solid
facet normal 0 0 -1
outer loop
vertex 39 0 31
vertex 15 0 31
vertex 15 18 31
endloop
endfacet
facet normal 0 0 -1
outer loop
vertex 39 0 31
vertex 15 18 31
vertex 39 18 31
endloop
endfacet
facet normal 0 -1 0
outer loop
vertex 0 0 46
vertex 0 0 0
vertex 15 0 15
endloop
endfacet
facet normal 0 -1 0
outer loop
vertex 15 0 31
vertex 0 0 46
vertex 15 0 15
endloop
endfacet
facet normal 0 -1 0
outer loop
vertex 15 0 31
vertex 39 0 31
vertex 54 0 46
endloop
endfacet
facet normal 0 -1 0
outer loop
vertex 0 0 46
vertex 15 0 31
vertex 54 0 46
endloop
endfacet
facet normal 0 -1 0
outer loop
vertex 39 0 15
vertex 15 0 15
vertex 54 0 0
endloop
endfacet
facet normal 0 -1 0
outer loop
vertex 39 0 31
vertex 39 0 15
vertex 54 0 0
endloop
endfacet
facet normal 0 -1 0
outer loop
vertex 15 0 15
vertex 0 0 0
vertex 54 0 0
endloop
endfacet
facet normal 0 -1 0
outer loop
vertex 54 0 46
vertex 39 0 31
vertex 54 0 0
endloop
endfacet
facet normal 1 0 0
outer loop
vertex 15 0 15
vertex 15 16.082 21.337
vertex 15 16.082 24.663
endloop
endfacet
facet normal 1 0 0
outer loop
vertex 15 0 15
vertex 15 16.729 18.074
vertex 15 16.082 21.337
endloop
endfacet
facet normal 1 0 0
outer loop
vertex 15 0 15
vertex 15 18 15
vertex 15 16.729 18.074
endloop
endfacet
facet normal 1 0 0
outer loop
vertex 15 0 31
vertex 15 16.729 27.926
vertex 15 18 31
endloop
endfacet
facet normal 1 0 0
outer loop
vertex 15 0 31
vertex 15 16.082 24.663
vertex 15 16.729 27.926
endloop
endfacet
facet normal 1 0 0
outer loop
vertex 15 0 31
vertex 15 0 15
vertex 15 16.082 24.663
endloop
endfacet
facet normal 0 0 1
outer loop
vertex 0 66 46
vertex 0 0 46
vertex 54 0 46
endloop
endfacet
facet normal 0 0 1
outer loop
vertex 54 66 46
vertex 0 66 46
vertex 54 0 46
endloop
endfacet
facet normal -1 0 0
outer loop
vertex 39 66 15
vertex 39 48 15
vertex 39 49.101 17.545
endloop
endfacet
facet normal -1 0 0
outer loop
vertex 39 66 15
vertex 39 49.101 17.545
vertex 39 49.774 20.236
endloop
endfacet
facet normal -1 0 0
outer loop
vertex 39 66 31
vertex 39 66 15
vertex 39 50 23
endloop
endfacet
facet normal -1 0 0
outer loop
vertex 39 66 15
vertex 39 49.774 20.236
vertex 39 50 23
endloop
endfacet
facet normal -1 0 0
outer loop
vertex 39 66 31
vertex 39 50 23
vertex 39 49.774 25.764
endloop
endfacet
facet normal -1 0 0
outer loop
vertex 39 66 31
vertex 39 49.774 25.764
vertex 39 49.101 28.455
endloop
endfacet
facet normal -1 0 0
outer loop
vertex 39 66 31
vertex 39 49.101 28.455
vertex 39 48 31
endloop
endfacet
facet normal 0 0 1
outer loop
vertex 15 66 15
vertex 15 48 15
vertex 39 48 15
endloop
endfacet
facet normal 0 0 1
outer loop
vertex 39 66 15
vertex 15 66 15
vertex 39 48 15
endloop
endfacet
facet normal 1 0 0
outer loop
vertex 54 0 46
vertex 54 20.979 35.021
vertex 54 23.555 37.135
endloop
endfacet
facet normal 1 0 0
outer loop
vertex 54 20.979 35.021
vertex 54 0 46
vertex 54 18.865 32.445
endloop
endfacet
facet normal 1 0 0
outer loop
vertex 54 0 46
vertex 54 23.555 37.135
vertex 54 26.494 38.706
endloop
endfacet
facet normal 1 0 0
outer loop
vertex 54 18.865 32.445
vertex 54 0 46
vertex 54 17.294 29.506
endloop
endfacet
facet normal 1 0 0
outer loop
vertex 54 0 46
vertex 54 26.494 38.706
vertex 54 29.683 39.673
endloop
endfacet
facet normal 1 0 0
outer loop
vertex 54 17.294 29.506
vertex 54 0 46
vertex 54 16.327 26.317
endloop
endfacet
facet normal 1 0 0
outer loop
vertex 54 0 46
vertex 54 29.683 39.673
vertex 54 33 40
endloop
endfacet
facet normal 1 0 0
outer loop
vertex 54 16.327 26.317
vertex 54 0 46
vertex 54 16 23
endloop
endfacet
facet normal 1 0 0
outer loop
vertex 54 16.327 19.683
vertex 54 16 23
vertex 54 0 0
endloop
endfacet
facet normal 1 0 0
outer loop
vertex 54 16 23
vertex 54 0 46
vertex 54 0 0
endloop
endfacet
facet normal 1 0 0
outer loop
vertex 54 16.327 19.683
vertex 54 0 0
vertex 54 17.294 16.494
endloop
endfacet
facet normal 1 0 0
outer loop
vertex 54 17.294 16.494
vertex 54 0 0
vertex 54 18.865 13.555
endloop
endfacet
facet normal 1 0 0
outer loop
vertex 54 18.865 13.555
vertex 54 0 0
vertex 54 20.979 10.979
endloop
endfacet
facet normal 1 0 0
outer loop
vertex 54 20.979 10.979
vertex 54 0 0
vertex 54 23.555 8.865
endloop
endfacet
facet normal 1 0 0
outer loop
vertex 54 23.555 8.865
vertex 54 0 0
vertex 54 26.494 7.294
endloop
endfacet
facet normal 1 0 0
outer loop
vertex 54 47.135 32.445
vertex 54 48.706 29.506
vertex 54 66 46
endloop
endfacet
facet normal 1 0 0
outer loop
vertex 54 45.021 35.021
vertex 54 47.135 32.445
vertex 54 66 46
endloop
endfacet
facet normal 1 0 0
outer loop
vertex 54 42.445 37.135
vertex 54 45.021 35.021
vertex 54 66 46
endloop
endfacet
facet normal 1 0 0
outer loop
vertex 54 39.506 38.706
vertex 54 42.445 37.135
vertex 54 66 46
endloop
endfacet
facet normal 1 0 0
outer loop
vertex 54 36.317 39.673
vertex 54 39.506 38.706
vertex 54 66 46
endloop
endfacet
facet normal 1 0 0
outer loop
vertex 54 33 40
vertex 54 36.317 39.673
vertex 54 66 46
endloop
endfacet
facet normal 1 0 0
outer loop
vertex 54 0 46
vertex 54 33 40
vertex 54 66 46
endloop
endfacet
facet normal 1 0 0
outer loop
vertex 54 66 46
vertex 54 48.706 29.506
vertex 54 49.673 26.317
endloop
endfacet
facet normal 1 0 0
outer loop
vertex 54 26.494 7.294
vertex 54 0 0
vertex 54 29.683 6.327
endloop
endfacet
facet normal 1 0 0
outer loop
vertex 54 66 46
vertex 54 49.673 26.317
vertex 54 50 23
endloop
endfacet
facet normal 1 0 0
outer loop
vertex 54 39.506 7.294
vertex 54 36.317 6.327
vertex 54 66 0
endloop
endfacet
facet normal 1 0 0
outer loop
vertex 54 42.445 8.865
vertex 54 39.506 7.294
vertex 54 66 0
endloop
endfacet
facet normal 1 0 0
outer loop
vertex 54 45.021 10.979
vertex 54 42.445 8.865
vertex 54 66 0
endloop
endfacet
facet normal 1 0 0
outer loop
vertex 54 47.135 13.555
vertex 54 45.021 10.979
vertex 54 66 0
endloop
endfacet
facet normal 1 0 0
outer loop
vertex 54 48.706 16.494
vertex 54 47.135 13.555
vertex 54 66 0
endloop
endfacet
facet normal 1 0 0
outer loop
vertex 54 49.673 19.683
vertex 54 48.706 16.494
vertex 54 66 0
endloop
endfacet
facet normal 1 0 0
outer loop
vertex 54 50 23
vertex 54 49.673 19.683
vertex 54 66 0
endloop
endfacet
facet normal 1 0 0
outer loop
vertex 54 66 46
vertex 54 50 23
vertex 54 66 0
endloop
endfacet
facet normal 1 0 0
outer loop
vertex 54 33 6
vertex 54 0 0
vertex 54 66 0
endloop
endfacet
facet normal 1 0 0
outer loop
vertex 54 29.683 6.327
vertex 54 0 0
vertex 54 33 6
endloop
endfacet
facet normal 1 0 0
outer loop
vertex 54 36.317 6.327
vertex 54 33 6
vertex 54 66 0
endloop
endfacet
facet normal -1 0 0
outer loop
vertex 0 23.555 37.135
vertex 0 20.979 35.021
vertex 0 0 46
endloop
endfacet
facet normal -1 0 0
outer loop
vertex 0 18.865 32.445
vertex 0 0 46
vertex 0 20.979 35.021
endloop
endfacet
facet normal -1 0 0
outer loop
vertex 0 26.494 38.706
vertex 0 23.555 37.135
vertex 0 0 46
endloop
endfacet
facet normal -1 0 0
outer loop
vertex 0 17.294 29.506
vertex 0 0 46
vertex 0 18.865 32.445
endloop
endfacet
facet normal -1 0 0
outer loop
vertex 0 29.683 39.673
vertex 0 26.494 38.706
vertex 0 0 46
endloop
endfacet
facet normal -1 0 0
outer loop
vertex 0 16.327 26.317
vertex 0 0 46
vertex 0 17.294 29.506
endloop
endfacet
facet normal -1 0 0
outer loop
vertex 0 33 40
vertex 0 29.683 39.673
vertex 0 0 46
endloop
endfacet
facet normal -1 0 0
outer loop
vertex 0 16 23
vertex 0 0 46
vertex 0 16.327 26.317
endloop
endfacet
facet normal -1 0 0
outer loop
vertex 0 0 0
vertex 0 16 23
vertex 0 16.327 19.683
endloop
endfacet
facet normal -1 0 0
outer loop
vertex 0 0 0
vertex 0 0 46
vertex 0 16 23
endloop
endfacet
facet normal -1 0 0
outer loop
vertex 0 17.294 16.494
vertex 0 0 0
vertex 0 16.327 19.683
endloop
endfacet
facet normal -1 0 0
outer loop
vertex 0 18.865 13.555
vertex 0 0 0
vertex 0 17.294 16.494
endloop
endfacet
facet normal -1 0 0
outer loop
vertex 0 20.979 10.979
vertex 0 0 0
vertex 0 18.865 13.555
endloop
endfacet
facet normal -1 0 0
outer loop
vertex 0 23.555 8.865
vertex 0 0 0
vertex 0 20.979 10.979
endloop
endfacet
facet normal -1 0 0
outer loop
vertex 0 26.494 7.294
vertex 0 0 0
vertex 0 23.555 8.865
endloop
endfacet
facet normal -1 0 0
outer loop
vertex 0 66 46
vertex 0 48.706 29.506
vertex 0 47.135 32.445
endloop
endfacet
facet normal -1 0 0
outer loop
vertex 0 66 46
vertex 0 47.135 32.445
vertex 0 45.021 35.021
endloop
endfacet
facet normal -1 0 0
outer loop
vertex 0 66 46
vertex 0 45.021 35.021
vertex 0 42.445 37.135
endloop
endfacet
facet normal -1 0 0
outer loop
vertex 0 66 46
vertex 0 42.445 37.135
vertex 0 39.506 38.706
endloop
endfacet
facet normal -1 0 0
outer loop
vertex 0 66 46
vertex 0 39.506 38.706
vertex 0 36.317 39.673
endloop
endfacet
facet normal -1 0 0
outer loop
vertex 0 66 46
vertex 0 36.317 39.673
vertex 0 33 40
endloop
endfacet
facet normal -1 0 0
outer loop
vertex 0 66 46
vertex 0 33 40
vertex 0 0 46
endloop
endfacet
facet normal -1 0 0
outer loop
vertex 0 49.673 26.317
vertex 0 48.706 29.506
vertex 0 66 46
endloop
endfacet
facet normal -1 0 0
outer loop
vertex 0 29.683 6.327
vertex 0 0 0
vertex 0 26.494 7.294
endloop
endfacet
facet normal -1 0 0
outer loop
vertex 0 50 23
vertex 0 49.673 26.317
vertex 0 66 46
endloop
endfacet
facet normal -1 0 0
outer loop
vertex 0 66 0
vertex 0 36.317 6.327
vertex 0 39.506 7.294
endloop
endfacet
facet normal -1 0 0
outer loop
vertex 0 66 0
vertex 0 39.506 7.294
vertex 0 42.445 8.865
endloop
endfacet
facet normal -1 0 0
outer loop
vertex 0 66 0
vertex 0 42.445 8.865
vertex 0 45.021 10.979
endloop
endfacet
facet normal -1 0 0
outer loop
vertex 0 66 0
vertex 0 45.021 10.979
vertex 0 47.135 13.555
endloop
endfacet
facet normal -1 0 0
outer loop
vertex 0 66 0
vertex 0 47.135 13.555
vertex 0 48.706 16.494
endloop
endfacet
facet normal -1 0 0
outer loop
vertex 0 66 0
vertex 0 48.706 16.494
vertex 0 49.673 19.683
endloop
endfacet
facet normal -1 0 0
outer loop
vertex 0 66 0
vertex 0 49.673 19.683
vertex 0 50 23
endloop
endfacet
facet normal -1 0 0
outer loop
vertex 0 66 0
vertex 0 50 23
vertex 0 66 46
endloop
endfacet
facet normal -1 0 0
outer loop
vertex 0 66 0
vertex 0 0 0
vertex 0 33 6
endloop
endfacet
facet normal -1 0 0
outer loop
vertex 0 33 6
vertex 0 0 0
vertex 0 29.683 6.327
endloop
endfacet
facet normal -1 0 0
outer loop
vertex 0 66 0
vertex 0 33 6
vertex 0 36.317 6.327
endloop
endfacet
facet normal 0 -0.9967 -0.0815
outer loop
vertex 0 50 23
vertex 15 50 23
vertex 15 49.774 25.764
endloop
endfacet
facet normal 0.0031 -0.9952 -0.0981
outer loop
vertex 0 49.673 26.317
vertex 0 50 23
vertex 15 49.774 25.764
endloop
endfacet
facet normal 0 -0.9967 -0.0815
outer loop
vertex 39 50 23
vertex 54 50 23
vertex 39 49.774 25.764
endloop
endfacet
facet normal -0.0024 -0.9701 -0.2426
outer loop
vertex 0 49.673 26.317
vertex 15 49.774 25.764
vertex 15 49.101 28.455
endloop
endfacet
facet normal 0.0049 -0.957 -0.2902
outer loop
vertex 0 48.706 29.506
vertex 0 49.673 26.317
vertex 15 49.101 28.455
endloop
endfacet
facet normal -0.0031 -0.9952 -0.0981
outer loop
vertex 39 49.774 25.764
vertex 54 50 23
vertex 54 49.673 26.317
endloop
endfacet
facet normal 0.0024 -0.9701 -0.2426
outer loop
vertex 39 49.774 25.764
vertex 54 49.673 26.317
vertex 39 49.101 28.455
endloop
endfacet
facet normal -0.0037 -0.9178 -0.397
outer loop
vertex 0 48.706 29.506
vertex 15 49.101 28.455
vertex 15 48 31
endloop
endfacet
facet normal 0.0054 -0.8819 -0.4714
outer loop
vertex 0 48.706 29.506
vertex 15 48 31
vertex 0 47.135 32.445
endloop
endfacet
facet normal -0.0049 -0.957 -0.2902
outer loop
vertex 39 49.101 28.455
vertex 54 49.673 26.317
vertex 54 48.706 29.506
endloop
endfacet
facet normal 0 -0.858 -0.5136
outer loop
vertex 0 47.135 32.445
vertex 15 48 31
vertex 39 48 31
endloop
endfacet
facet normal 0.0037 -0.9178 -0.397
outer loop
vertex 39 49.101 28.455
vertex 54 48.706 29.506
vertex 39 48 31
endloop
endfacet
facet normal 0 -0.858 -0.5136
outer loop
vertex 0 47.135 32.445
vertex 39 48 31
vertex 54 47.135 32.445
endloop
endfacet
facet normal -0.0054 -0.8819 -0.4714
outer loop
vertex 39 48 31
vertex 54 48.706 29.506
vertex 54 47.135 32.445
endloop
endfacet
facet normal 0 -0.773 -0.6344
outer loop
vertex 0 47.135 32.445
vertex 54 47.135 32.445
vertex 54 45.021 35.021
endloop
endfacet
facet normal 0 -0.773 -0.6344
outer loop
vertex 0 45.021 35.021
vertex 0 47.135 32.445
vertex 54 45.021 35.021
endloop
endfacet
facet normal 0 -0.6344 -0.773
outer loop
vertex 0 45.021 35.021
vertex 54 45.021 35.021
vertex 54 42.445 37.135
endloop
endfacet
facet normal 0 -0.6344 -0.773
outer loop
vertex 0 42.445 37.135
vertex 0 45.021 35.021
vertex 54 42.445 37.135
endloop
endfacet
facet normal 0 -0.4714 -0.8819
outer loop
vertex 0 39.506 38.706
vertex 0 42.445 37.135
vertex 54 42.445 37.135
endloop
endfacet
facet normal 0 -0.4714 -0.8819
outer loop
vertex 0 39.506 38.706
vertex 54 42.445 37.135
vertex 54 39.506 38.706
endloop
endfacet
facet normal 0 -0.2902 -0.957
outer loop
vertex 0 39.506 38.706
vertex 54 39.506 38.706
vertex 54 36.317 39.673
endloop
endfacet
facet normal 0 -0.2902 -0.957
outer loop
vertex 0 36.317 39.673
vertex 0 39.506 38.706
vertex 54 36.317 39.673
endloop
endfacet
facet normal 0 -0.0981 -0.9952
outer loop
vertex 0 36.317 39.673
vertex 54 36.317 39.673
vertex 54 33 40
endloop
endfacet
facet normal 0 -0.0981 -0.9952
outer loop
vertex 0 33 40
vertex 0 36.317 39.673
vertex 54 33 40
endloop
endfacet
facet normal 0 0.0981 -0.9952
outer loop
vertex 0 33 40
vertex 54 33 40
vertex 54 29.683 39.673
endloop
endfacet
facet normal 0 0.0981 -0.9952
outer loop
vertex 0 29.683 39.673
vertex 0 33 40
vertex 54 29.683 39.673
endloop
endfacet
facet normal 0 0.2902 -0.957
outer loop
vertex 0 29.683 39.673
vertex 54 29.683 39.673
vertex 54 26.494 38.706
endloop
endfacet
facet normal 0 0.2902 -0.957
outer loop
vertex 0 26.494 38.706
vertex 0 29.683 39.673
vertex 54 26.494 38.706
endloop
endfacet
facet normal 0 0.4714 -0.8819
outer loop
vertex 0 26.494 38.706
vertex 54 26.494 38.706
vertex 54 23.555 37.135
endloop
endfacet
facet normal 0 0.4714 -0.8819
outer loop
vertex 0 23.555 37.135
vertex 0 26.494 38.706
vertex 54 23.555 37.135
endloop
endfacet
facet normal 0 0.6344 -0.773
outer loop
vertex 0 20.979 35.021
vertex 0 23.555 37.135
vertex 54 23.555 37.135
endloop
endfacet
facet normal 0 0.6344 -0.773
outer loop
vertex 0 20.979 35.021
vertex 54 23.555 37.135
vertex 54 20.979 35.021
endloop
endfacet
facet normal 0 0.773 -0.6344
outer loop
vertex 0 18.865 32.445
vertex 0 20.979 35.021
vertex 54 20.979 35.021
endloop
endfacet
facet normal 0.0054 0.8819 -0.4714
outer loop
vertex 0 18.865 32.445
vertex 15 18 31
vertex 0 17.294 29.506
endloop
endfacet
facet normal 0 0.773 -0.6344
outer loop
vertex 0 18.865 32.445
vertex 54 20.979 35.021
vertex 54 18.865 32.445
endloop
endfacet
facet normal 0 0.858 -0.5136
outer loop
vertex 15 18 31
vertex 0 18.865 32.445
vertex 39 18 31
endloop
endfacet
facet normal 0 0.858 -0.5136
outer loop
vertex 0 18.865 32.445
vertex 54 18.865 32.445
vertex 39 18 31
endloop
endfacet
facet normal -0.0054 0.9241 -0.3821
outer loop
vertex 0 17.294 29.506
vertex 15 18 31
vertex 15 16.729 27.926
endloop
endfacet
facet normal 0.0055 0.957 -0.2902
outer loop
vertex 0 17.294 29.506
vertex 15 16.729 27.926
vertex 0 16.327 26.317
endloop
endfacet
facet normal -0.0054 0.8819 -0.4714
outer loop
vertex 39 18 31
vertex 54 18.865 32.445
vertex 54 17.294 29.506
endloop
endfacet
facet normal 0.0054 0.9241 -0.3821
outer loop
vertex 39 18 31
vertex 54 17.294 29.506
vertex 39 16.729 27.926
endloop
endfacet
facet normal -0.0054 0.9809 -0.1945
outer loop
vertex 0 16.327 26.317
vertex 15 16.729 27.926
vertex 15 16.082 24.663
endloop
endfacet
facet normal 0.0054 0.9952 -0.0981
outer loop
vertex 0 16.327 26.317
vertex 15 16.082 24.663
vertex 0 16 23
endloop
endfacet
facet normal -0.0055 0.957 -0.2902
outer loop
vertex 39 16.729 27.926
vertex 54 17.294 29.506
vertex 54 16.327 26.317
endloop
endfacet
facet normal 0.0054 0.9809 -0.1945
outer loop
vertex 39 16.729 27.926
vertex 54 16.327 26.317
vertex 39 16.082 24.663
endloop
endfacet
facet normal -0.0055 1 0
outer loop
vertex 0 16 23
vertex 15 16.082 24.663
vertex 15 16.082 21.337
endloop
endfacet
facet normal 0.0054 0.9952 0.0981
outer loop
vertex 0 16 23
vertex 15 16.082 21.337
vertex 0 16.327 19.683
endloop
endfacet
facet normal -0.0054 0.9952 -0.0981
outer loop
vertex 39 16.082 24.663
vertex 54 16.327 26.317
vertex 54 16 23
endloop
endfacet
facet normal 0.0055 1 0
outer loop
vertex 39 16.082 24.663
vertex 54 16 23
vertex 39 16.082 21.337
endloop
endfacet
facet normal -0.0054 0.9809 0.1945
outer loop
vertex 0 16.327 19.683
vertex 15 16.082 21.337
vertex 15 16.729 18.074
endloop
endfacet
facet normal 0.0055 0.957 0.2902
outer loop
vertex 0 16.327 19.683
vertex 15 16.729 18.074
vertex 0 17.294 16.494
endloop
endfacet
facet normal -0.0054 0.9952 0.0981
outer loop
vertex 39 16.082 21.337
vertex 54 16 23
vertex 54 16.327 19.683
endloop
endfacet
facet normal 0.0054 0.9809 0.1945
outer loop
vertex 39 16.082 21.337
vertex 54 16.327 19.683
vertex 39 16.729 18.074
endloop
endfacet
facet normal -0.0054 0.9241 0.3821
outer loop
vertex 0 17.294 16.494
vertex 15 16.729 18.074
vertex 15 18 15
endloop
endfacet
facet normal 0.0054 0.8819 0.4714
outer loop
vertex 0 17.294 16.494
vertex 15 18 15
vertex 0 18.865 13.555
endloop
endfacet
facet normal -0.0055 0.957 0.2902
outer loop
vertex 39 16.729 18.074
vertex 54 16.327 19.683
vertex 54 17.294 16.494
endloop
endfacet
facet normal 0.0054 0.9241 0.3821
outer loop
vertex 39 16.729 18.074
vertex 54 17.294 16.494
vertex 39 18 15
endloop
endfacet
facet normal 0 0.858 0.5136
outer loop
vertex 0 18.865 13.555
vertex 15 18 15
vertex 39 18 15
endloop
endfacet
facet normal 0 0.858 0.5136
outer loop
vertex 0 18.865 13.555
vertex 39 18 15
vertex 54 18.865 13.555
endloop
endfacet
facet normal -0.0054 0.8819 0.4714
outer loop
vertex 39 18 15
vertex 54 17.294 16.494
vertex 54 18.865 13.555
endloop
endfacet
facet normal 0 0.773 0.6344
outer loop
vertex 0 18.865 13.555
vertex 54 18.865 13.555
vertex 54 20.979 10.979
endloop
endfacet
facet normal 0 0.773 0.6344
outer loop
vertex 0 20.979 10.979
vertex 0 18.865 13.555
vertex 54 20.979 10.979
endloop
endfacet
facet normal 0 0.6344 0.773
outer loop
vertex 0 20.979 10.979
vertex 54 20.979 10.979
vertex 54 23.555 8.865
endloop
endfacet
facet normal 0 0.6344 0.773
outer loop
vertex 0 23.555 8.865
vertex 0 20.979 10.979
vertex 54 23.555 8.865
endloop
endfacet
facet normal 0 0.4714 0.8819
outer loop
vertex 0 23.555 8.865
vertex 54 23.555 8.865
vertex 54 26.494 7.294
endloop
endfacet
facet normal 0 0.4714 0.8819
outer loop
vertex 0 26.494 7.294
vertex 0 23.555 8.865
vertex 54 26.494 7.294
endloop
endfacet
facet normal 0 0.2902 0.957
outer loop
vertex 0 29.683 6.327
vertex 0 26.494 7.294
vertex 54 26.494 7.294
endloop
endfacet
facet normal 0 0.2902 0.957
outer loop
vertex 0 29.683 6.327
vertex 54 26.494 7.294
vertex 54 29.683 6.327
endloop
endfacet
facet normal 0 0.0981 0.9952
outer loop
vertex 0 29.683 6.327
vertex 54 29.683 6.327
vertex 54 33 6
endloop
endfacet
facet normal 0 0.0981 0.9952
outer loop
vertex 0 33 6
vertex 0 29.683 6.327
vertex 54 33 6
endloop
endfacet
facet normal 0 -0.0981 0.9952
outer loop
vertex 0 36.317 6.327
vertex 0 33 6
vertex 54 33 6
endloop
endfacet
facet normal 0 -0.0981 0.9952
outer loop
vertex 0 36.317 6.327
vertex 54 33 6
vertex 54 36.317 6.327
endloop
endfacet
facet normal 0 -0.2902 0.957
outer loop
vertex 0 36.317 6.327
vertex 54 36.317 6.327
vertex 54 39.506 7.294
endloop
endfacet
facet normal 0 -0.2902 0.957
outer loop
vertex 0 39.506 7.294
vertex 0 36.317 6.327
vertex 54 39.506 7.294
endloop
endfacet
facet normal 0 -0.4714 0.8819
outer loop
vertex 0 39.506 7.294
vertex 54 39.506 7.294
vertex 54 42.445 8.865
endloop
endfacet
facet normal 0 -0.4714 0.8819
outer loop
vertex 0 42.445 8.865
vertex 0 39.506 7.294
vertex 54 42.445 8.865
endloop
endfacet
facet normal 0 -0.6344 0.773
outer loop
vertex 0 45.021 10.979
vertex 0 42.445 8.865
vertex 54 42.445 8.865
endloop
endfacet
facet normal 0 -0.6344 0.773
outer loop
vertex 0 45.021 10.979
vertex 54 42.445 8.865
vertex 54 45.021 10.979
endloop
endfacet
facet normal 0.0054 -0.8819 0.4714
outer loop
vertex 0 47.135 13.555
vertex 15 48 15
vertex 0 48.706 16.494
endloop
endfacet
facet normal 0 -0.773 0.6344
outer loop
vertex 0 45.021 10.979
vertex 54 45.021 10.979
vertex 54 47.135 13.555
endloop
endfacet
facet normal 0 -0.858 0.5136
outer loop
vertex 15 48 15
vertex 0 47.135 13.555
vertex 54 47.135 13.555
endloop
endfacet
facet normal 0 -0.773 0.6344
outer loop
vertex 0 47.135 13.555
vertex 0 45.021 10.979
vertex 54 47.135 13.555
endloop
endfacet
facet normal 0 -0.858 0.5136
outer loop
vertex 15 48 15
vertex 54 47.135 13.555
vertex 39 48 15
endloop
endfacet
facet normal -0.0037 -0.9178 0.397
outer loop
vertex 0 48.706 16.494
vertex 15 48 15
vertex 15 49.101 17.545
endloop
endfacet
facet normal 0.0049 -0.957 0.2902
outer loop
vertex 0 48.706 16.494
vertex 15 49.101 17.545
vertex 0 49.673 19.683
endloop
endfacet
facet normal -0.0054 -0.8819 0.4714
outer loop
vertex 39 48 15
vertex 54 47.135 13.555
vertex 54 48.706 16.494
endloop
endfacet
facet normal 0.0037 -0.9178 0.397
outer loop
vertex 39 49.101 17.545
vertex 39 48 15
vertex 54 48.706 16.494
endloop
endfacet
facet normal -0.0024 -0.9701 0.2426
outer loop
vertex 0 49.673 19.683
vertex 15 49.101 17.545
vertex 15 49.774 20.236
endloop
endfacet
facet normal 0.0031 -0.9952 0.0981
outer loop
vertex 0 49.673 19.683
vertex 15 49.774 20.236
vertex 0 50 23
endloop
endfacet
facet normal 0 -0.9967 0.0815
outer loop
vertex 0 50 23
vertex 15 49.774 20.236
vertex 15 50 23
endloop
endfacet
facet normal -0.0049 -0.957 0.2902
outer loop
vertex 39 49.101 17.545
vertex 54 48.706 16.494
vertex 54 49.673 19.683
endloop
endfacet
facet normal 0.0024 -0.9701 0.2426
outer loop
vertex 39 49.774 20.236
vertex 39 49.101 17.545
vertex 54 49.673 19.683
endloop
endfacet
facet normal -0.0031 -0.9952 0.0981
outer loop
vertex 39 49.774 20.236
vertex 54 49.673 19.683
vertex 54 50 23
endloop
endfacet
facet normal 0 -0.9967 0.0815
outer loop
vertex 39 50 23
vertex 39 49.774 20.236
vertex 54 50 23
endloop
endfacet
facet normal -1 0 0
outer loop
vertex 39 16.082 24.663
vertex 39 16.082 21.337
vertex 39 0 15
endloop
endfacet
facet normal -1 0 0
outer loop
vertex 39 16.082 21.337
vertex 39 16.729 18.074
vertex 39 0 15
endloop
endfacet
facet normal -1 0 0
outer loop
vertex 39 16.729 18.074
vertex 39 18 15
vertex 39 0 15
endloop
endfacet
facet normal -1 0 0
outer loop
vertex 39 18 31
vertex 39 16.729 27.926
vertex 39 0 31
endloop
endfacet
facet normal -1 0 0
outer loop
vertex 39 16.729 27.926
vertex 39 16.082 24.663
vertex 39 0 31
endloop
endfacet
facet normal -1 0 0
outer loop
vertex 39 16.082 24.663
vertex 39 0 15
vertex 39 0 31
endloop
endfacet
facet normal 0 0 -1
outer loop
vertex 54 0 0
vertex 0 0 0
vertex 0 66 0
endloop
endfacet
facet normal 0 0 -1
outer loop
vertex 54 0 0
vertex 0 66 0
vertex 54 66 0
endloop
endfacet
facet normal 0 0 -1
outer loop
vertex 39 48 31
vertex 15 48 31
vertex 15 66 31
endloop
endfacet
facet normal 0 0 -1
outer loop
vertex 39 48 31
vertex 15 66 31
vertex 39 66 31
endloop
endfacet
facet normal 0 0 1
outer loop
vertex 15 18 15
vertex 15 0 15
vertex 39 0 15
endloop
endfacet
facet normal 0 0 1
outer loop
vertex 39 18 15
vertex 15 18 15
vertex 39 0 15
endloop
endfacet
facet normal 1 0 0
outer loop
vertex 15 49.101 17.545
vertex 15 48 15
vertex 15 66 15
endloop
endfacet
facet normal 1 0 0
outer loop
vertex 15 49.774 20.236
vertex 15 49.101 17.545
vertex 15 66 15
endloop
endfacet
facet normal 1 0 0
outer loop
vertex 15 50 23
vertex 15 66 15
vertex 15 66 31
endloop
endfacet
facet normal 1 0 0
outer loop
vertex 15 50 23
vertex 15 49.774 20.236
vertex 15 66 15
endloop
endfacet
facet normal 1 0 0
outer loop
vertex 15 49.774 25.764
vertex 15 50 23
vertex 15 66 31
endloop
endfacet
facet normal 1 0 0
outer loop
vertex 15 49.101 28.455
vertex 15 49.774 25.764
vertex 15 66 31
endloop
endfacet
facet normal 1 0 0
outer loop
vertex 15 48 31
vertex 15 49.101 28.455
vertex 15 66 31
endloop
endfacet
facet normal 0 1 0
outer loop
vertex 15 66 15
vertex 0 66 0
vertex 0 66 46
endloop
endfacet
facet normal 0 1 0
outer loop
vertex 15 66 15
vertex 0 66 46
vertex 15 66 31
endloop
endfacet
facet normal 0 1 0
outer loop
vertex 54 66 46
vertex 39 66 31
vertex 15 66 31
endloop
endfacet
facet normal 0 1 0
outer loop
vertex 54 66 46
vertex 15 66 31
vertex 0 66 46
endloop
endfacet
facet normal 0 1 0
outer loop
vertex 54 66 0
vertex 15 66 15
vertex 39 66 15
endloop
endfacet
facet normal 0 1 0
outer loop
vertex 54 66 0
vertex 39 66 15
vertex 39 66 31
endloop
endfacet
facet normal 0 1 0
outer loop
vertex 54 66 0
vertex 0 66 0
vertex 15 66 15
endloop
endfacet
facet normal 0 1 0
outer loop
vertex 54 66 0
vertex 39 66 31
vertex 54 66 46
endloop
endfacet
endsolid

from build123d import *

# Parameters (mm, degrees)
F0_W     = 54
F0_H     = 66
F1_DEPTH = 46
F2_W     = 24
F2_H     = 16
F3_DEPTH = 66
F4_R     = 17
F5_DEPTH = 54


with BuildPart() as f1:
    # F0 (on Top) → F1 (new body)
    with BuildSketch(Plane.XY):
        with Locations((27, 33)):
            Rectangle(F0_W, F0_H)
    extrude(amount=F1_DEPTH)

    # F2 (on face) → F3 (cut)
    with BuildSketch(Plane.XZ):
        with Locations((27, 23)):
            Rectangle(F2_W, F2_H)
    extrude(amount=-F3_DEPTH, mode=Mode.SUBTRACT)

    # F4 (on face) → F5 (cut)
    with BuildSketch(Plane.YZ.offset(54)):
        with Locations((33, 23)):
            Circle(F4_R)
    extrude(amount=-F5_DEPTH, mode=Mode.SUBTRACT)


solid = f1.part
